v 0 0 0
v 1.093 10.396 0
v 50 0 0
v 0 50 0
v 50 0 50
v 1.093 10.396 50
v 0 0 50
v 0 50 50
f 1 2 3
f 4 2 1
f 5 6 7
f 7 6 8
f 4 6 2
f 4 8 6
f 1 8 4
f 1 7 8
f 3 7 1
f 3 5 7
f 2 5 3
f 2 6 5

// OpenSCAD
// Generated by CadMonkey
// Prompt: hey cadmonkey, create me a pyramid
// Generated at: 2025-11-10 21:30:38

module pyramid(base_size, height) {
  linear_extrude(height = base_size)
    polygon(points=[[0,0], [base_size, 0], [base_size * (1 - cos(360 / height)), base_size * sin(360 / height)], [0, base_size]]);
}

pyramid(50, 30);
